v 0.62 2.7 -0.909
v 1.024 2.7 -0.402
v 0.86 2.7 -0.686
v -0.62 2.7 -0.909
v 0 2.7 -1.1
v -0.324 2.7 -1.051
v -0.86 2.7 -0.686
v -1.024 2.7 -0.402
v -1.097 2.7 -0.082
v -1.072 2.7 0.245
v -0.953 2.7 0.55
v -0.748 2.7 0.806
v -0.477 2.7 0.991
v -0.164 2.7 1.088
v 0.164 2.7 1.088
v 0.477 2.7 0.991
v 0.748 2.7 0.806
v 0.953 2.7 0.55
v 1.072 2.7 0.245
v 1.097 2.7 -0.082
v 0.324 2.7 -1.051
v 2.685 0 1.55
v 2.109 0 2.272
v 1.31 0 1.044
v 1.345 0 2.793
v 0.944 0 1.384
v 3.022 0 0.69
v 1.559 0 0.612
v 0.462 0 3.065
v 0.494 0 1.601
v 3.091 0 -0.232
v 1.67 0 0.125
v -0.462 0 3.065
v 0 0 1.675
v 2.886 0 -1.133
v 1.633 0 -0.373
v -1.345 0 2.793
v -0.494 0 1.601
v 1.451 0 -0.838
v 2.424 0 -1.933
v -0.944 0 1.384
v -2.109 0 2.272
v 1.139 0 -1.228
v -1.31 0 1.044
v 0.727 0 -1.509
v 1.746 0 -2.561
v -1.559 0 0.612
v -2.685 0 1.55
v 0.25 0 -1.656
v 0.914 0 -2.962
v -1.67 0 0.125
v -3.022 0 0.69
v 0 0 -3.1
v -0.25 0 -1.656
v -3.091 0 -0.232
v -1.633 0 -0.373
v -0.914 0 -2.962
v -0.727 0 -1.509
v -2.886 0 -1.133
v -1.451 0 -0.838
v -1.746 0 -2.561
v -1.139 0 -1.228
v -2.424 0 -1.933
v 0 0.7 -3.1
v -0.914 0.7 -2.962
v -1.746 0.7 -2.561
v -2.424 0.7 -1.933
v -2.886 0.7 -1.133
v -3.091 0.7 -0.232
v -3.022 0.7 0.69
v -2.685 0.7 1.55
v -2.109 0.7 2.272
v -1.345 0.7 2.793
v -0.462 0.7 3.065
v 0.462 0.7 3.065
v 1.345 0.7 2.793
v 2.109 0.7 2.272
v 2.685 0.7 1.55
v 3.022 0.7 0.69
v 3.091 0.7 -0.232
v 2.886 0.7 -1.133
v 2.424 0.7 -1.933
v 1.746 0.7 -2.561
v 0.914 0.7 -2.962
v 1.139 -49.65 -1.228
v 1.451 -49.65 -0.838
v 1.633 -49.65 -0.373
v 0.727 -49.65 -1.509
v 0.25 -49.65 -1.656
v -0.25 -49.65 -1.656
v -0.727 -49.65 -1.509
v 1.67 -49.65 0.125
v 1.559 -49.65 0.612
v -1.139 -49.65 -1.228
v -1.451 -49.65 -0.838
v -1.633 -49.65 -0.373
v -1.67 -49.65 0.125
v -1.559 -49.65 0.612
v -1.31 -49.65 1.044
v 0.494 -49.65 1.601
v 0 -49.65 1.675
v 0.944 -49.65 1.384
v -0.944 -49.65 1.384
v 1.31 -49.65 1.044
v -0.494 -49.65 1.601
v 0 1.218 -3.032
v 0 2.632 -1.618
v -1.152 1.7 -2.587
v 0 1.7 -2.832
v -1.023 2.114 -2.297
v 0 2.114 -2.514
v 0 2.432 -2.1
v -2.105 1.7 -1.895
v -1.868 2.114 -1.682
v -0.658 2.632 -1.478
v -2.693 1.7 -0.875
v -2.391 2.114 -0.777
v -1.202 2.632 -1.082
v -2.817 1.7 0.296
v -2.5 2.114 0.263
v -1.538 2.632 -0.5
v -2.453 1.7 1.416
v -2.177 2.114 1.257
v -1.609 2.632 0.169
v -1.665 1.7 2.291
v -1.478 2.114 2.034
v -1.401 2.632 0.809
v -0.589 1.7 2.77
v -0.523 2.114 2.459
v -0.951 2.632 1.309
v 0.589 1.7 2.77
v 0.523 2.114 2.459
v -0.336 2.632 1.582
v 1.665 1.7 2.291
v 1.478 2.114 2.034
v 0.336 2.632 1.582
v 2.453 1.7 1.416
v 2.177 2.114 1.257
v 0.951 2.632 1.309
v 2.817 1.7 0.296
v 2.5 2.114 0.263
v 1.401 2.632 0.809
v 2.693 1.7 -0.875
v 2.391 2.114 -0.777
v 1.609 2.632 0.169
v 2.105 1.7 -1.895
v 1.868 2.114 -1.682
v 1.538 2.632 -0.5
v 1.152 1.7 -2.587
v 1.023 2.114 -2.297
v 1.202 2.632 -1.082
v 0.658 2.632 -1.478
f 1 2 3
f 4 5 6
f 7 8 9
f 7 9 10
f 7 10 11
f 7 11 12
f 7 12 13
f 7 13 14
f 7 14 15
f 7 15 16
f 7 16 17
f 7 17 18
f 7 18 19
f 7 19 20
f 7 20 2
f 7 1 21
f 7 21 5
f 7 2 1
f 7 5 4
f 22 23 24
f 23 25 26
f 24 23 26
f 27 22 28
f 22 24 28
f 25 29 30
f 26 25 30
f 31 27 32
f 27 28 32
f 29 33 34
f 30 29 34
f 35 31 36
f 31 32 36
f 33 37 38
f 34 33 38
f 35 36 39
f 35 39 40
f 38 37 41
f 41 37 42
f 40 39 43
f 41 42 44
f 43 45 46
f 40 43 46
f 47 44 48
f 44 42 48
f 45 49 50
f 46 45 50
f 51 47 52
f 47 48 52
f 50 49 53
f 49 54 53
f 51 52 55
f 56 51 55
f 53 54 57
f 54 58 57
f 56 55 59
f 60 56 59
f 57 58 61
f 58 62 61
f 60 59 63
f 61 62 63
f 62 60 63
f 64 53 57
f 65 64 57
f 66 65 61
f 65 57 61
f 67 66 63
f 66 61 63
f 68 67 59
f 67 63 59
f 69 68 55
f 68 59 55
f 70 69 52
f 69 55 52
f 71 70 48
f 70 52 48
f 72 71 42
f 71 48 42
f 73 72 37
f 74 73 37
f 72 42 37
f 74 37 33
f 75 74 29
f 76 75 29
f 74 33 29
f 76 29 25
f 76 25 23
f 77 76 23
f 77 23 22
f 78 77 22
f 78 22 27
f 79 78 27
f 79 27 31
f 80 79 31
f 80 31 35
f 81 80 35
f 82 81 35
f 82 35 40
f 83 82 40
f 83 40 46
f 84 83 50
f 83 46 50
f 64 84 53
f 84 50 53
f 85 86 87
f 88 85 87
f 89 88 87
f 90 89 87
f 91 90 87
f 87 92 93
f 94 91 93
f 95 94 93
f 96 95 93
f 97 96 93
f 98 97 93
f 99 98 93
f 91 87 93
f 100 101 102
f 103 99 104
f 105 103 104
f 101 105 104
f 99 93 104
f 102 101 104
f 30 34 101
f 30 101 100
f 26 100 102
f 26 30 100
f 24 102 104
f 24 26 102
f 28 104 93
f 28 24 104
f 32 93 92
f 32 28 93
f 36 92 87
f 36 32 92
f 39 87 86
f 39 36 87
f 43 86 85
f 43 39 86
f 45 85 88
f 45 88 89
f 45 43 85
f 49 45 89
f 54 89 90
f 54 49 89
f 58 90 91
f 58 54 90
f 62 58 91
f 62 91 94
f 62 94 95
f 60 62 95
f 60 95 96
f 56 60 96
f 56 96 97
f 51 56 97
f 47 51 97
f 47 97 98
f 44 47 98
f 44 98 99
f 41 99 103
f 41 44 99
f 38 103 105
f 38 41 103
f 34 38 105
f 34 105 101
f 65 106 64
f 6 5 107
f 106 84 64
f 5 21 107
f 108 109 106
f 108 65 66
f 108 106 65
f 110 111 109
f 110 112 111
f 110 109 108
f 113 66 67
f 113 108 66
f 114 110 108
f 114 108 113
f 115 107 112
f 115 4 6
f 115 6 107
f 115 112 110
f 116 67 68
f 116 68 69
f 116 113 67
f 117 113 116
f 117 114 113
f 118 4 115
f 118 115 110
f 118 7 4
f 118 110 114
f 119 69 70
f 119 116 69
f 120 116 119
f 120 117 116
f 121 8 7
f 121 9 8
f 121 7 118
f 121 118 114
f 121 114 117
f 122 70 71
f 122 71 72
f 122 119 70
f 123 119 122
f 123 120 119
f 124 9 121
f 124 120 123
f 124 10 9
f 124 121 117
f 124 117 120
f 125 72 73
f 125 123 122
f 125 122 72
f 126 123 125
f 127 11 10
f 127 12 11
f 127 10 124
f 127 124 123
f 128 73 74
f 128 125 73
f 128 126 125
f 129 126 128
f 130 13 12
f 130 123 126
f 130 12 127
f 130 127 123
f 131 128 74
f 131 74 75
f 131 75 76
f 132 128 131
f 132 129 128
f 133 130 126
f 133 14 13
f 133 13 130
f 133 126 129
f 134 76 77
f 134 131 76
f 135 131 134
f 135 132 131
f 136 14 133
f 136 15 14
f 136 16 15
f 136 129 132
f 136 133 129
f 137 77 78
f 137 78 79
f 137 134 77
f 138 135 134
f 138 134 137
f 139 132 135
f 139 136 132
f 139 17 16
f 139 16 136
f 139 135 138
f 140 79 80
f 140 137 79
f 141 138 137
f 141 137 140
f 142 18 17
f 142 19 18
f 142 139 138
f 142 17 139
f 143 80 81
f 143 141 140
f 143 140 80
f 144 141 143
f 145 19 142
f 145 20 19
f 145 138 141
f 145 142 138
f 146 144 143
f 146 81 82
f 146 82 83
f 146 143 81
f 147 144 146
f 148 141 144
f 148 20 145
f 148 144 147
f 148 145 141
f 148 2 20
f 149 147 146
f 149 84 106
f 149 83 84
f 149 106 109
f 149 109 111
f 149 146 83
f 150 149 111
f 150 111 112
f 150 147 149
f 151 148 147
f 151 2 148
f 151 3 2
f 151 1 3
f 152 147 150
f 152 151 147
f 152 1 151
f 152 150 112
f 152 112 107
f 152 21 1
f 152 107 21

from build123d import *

# Parameters (mm, degrees)
CROQUIS1_R              = 1.675
SALIENTE_EXTRUIR1_DEPTH = 49.65
CROQUIS2_R              = 3.1
SALIENTE_EXTRUIR2_DEPTH = 2.7
REDONDEO1_R             = 2


with BuildPart() as part:
    # Croquis1 → Saliente-Extruir1 (new body)
    with BuildSketch(Plane(origin=(0, 0, 0), x_dir=(1, 0, 0), z_dir=(0, 1, 0))):
        with Locations(Location((0, 0, 0), (0, 0, 270))):
            Circle(CROQUIS1_R)
    extrude(amount=-SALIENTE_EXTRUIR1_DEPTH)

    # Croquis2 → Saliente-Extruir2 (add)
    with BuildSketch(Plane(origin=(0, 0, 0), x_dir=(1, 0, 0), z_dir=(0, 1, 0))):
        with Locations(Location((0, 0, 0), (0, 0, 90))):
            Circle(CROQUIS2_R)
    extrude(amount=SALIENTE_EXTRUIR2_DEPTH)

    # Redondeo1
    redondeo1_edges = [part.edges().sort_by_distance(p)[0] for p in [
        (0, 2.7, 3.1),
    ]]
    fillet(redondeo1_edges, radius=REDONDEO1_R)


solid = part.part
